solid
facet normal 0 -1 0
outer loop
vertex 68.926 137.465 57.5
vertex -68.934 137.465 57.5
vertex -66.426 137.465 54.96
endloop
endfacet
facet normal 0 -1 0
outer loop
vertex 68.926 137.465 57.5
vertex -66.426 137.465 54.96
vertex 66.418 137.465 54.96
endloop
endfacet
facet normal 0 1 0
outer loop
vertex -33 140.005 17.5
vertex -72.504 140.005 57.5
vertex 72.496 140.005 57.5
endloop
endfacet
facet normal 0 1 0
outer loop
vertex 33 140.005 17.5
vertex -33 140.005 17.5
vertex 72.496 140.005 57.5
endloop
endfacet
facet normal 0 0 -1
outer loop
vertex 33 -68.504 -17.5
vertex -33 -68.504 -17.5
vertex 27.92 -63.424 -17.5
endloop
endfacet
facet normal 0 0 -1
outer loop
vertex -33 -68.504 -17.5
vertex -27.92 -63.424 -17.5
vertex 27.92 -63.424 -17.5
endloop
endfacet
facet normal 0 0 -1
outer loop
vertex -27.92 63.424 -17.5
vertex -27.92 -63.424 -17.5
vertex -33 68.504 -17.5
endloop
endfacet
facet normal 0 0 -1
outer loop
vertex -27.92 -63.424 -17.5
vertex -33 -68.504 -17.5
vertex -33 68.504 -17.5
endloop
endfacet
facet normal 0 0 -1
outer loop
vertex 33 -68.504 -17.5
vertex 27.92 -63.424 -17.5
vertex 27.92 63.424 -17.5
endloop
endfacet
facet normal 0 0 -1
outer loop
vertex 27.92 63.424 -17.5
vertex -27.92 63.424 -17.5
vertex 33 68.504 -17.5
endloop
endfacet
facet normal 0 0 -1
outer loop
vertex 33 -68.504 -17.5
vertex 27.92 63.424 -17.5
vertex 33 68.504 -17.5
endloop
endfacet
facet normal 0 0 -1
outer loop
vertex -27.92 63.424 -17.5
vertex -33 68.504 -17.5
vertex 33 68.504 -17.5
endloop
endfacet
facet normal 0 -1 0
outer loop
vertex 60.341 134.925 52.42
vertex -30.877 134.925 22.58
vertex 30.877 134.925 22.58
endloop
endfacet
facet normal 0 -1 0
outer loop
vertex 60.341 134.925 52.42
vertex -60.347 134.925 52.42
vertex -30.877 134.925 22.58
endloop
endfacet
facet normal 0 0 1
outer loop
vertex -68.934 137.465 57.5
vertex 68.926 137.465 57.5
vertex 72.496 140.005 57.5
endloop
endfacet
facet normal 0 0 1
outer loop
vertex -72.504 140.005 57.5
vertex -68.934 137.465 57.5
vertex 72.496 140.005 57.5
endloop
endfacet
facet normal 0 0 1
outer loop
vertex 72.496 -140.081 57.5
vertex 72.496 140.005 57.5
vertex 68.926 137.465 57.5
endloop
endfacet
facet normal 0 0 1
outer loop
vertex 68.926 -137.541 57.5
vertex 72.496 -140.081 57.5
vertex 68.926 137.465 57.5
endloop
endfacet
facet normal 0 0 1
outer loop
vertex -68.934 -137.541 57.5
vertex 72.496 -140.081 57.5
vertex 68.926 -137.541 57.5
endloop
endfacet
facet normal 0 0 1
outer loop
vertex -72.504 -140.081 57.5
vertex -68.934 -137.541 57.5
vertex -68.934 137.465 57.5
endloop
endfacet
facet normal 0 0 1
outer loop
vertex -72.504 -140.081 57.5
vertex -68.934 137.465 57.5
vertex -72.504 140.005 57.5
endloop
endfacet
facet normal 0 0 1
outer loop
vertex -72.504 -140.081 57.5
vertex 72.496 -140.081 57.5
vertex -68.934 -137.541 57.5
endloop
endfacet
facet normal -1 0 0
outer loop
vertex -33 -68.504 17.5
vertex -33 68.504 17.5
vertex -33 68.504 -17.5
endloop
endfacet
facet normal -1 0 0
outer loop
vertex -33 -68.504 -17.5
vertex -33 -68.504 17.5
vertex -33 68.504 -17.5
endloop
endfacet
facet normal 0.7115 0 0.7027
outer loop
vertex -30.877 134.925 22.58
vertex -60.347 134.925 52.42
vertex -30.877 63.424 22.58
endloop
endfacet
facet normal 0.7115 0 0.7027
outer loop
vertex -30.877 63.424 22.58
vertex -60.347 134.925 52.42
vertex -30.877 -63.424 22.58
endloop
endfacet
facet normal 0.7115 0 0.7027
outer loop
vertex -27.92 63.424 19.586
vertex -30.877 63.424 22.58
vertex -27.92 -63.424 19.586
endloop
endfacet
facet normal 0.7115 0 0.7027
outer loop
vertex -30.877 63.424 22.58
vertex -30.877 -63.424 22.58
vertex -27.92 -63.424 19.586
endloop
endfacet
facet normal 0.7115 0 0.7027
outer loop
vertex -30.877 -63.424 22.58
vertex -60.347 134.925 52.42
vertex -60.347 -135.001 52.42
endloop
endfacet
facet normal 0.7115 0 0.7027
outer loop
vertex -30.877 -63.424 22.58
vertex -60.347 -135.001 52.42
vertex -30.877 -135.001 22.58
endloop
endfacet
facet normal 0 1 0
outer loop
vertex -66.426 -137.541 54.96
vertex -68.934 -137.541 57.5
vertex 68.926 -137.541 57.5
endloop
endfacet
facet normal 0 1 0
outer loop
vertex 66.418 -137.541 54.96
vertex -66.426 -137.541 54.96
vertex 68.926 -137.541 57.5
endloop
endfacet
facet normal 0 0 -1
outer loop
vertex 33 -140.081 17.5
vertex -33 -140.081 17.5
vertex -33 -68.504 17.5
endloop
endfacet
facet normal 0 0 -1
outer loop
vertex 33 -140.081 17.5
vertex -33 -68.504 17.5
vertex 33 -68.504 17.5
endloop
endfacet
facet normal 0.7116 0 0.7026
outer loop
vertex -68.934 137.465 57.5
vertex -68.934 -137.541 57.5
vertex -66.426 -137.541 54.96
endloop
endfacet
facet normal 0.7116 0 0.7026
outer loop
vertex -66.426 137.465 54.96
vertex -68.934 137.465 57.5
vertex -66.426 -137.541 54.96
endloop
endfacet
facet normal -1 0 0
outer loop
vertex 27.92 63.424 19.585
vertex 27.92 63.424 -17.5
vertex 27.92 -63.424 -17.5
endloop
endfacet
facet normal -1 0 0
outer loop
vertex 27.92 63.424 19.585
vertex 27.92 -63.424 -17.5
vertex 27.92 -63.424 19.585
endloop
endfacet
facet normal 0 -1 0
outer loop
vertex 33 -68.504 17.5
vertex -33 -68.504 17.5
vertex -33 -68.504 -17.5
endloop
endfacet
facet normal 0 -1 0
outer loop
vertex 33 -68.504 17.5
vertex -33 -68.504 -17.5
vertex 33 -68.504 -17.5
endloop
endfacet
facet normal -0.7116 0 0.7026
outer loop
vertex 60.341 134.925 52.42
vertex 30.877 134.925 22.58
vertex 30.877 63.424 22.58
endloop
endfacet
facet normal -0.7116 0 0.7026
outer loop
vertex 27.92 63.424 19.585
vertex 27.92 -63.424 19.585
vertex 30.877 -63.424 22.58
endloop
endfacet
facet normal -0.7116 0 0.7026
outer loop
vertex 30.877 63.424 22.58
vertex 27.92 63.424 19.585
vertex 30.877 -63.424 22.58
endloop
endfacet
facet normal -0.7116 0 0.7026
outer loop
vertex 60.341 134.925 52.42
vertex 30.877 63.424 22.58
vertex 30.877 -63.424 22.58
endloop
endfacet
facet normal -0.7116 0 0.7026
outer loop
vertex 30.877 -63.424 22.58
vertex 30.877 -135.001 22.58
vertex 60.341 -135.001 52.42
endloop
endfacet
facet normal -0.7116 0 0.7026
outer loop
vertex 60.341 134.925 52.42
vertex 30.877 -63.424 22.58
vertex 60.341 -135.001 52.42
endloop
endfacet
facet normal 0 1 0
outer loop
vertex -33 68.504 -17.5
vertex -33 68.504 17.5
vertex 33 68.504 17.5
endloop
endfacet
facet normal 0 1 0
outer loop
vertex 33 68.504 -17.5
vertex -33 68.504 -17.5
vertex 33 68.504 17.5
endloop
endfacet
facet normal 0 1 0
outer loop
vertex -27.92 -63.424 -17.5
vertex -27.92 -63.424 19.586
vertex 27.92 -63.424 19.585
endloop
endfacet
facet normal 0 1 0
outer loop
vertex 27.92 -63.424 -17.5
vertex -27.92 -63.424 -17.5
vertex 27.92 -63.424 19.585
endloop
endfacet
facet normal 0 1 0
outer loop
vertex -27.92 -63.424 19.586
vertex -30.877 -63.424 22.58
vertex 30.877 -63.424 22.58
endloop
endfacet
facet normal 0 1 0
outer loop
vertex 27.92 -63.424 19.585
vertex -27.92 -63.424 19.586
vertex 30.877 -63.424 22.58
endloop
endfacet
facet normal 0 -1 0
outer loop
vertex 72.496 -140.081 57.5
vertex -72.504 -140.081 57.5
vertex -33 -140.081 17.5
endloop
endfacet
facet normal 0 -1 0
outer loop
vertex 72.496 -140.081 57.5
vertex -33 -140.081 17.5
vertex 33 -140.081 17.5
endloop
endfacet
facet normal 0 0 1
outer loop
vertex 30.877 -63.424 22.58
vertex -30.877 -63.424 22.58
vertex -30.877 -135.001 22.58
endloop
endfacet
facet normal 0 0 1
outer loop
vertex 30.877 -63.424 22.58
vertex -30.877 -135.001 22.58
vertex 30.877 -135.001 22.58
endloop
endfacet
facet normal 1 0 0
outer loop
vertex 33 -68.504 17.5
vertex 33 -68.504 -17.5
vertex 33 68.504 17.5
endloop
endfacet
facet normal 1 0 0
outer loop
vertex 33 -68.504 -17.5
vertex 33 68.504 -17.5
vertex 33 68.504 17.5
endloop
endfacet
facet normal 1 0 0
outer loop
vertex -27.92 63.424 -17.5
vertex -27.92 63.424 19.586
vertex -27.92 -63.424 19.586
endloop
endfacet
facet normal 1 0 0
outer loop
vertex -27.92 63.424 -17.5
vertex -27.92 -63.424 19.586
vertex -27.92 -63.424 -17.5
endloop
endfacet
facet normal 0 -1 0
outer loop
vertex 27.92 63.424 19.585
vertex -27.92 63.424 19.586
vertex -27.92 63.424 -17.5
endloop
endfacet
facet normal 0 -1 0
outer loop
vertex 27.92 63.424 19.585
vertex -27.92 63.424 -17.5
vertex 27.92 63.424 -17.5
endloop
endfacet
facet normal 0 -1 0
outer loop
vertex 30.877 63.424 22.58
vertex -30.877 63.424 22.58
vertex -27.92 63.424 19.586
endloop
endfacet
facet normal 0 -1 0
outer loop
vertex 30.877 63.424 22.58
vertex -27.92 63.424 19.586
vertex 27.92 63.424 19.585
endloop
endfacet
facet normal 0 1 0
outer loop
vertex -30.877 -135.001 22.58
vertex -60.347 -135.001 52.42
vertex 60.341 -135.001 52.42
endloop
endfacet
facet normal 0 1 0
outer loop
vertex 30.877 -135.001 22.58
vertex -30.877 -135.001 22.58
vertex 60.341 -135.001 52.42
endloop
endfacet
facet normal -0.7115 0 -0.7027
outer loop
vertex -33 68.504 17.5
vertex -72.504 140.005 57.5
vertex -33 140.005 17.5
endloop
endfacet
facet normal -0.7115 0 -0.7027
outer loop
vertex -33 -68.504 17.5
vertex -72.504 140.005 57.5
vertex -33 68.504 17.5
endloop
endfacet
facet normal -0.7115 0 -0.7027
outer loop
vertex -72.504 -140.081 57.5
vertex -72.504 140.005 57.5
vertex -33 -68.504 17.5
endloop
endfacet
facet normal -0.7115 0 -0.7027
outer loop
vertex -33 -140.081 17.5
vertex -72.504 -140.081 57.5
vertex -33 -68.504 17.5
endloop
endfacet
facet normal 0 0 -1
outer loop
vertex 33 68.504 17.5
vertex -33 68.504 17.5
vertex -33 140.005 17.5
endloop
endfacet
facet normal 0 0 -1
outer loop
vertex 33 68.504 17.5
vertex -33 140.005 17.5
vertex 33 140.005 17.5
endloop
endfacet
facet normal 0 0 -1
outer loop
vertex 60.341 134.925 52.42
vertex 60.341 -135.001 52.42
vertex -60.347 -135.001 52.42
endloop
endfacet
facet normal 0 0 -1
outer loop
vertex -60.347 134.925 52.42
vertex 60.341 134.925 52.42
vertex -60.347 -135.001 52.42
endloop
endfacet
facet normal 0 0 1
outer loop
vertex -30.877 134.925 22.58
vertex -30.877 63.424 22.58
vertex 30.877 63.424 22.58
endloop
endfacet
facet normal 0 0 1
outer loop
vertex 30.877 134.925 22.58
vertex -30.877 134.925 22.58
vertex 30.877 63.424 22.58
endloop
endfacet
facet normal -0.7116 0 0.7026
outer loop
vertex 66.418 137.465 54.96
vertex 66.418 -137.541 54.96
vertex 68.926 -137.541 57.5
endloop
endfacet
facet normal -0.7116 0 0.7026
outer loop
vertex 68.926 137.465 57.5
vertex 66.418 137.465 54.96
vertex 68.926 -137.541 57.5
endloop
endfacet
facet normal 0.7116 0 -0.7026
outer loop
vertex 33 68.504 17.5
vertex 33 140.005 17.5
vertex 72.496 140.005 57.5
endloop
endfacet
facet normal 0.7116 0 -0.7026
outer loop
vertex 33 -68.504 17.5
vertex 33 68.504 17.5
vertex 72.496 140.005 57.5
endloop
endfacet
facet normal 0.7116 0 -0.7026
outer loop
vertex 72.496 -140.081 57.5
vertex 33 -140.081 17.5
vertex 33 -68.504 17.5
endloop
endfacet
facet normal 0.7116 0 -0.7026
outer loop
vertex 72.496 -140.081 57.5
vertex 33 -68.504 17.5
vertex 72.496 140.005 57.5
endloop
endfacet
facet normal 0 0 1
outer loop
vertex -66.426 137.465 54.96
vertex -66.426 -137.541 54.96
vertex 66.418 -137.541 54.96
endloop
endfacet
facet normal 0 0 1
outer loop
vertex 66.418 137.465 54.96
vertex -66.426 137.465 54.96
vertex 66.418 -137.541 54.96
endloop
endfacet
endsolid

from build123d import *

# Parameters (mm, degrees)
F1_DEPTH     = 140.081
F2_DEPTH     = 140.0048
F3_DEPTH     = 68.5038
F4_DEPTH     = 68.5038
F5_T         = -5.08
F6_T         = 2.54
F6_T3_DEPTH  = 142.0876
F6_T5_DEPTH  = 71.08
F6_T7_DEPTH  = 275.0058
F6_T9_DEPTH  = 47.0194652776
F6_T11_DEPTH = 76.581
F6_T13_DEPTH = 9.2884577092
F6_T15_DEPTH = 76.6572
F6_T17_DEPTH = 125.7681103512
F6_T19_DEPTH = 47.0149573841
F6_T21_DEPTH = 66.8341103512
F6_T23_DEPTH = 47.0149573841
F6_T25_DEPTH = 9.2884593969
F6_T27_DEPTH = 42.1653521873
F6_T29_DEPTH = 42.16567527


# Not quite as in the source:
# - a shell that OpenCascade refuses in one call is made with other operations: the cavity is built on its own and cut out


with BuildPart() as f1:
    # F0 (on Front) → F1 (new body)
    with BuildSketch(Plane.XZ):
        Polygon((-72.5043, 57.5), (-33, 17.5), (0, 17.5), (33, 17.5), (72.4957, 57.5), align=None)
    extrude(amount=F1_DEPTH)

    # F0 (on Front) → F2 (join)
    with BuildSketch(Plane.XZ):
        Polygon((-72.5043, 57.5), (-33, 17.5), (0, 17.5), (33, 17.5), (72.4957, 57.5), align=None)
    extrude(amount=-F2_DEPTH)

    # F0 (on Front) → F3 (join)
    with BuildSketch(Plane.XZ):
        Polygon((-33, 17.5), (-33, -17.5), (33, -17.5), (33, 17.5), (0, 17.5), align=None)
    extrude(amount=-F3_DEPTH)

    # F0 (on Front) → F4 (join)
    with BuildSketch(Plane.XZ):
        Polygon((-33, 17.5), (-33, -17.5), (33, -17.5), (33, 17.5), (0, 17.5), align=None)
    extrude(amount=F4_DEPTH)

    # F5
    f5_openings = [f1.faces().sort_by_distance(p)[0] for p in [
        (0, 0, -17.5),
    ]]
    offset(amount=F5_T, openings=f5_openings, kind=Kind.INTERSECTION)

    # F6: shell of thickness 2.54, made by hand


with BuildPart() as f6_core1:
    # F6_t2: copy of F1
    add(f1.part)

    # the walls: a layer under each face that stays
    f6_faces = [f6_core1.faces().sort_by_distance(p)[0] for p in [
        (-52.75215, -0.0381, 37.5),
        (-0.0043, 140.0048, 37.5),
        (52.74785, -0.0381, 37.5),
        (33, 0, 0),
        (0, -68.5038, 0),
        (0, 68.5038, 0),
        (0, 104.2543, 17.5),
        (-33, 0, 0),
        (0, -104.2924, 17.5),
        (-0.0043, -140.081, 37.5),
        (-28.2857142857, 58.7175428571, -17.5),
        (-44.1337126804, -0.0381, 36.002837635),
        (-0.0033701852, 134.9248, 37.5),
        (44.1303424952, -0.0381, 36.0026760937),
        (27.92, 0, 1.0426760937),
        (28.4128154651, -63.4238, 21.0826760937),
        (0, -63.4238, 2.54),
        (-29.3986087804, -63.4238, 22.0809458783),
        (28.4128154651, 63.4238, 21.0826760937),
        (0, 63.4238, 2.54),
        (-29.3986087804, 63.4238, 22.0809458783),
        (-0.0001623852, 99.1743, 22.58),
        (-27.92, 0, 1.042837635),
        (-0.0001623852, -99.2124, 22.58),
        (-0.0033701852, -135.001, 37.5),
        (-0.0033701852, -0.0381, 52.42),
    ]]
    thicken(f6_faces, amount=-F6_T, mode=Mode.SUBTRACT)

    # F6_s4 → F6_t3 (cut)
    with BuildSketch(Plane.XZ.offset(-71.0438)):
        Polygon((-33.0434721427, 17.4821518164), (-31.192785733, 19.2848183642), (-30.46, 18.542837635), (-30.46, 17.5), align=None)
        Polygon((33.0434740854, 17.4821537837), (31.1925914624, 19.2846216345), (30.46, 18.5426760937), (30.46, 17.5), align=None)
    extrude(amount=F6_T3_DEPTH, mode=Mode.SUBTRACT)

    # F6_s6 → F6_t5 (cut)
    with BuildSketch(Plane.YZ.offset(-35.54)):
        Polygon((-68.5292, 17.4746), (-65.9638, 17.5), (-65.9638, 20.04), (-68.5038, 20.04), align=None)
        Polygon((68.5292, 17.4746), (65.9638, 17.5), (65.9638, 20.04), (68.5038, 20.04), align=None)
    extrude(amount=F6_T5_DEPTH, mode=Mode.SUBTRACT)

    # F6_s8 → F6_t7 (cut)
    with BuildSketch(Plane.XZ.offset(-137.4648)):
        Polygon((-60.3293532181, 52.4124481836), (-62.1546396278, 50.6351816358), (-66.4258626804, 54.96), (-60.3474253608, 54.96), align=None)
        Polygon((60.322610905, 52.4124462163), (62.148093528, 50.6353783655), (66.4181924952, 54.96), (60.3406849904, 54.96), align=None)
    extrude(amount=F6_T7_DEPTH, mode=Mode.SUBTRACT)

    # F6_s10 → F6_t9 (cut)
    with BuildSketch(Plane(origin=(-57.7902488571, 0, 58.5154009635), x_dir=(0, 1, 0), z_dir=(0.7026843954, 0, -0.7115016799))):
        Polygon((134.8994, -6.0771785187), (134.9248, -8.6425785187), (137.4648, -8.6425785187), (137.4648, -6.1025785187), align=None)
        Polygon((-134.9756, -6.0771785187), (-135.001, -8.6425785187), (-137.541, -8.6425785187), (-137.541, -6.1025785187), align=None)
    extrude(amount=F6_T9_DEPTH, mode=Mode.SUBTRACT)

    # F6_s12 → F6_t11 (cut)
    with BuildSketch(Plane.XZ.offset(-137.4648)):
        Polygon((-30.8591454181, 22.6232481836), (-32.6844318278, 20.7951816358), (-31.9386087804, 20.04), (-30.8772175608, 20.04), align=None)
        Polygon((30.858818705, 22.6232462163), (32.684301328, 20.7953783655), (31.9384463952, 20.04), (30.8768927904, 20.04), align=None)
    extrude(amount=F6_T11_DEPTH, mode=Mode.SUBTRACT)

    # F6_s14 → F6_t13 (cut)
    with BuildSketch(Plane(origin=(-28.3200410571, 0, 28.6754009635), x_dir=(0, 1, 0), z_dir=(0.7026843954, 0, -0.7115016799))):
        Polygon((63.3984, -6.0771785187), (63.4238, -8.6425785187), (65.9638, -8.6425785187), (65.9638, -6.1025785187), align=None)
        Polygon((-63.3984, -6.0771785187), (-63.4238, -8.6425785187), (-65.9638, -8.6425785187), (-65.9638, -6.1025785187), align=None)
    extrude(amount=F6_T13_DEPTH, mode=Mode.SUBTRACT)

    # F6_s16 → F6_t15 (cut)
    with BuildSketch(Plane.XZ.offset(60.8838)):
        Polygon((-30.8591454181, 22.6232481836), (-32.6844318278, 20.7951816358), (-31.9386087804, 20.04), (-30.8772175608, 20.04), align=None)
        Polygon((30.858818705, 22.6232462163), (32.684301328, 20.7953783655), (31.9384463952, 20.04), (30.8768927904, 20.04), align=None)
    extrude(amount=F6_T15_DEPTH, mode=Mode.SUBTRACT)

    # F6_s18 → F6_t17 (cut)
    with BuildSketch(Plane.YZ.offset(-62.8874253608)):
        Polygon((134.8994, 52.3946), (137.4648, 52.42), (137.4648, 54.96), (134.9248, 54.96), align=None)
        Polygon((-134.9756, 52.3946), (-137.541, 52.42), (-137.541, 54.96), (-135.001, 54.96), align=None)
    extrude(amount=F6_T17_DEPTH, mode=Mode.SUBTRACT)

    # F6_s20 → F6_t19 (cut)
    with BuildSketch(Plane(origin=(57.7800845012, 0, 58.5178482733), x_dir=(0, 1, 0), z_dir=(-0.7026069427, 0, -0.7115781644))):
        Polygon((134.8994, 6.0810579283), (137.4648, 6.1064579283), (137.4648, 8.6464579283), (134.9248, 8.6464579283), align=None)
    extrude(amount=F6_T19_DEPTH, mode=Mode.SUBTRACT)

    # F6_s22 → F6_t21 (cut)
    with BuildSketch(Plane.YZ.offset(-33.4172175608)):
        Polygon((134.8994, 22.6054), (137.4648, 22.58), (137.4648, 20.04), (134.9248, 20.04), align=None)
        Polygon((-134.9756, 22.6054), (-135.001, 20.04), (-137.541, 20.04), (-137.541, 22.58), align=None)
    extrude(amount=F6_T21_DEPTH, mode=Mode.SUBTRACT)

    # F6_s24 → F6_t23 (cut)
    with BuildSketch(Plane(origin=(24.7470490323, 0, 25.0630311981), x_dir=(0, 1, 0), z_dir=(0.7026069427, 0, 0.7115781644))):
        Polygon((-134.9756, -6.0810579283), (-135.001, -8.6464579283), (-137.541, -8.6464579283), (-137.541, -6.1064579283), align=None)
    extrude(amount=F6_T23_DEPTH, mode=Mode.SUBTRACT)

    # F6_s26 → F6_t25 (cut)
    with BuildSketch(Plane(origin=(21.7901562419, 0, 22.0683833854), x_dir=(0, 1, 0), z_dir=(0.7026069427, 0, 0.7115781644))):
        Polygon((-63.3984, -6.0810579283), (-63.4238, -8.6464579283), (-65.9638, -8.6464579283), (-65.9638, -6.1064579283), align=None)
        Polygon((63.3984, -6.0810579283), (63.4238, -8.6464579283), (65.9638, -8.6464579283), (65.9638, -6.1064579283), align=None)
    extrude(amount=F6_T25_DEPTH, mode=Mode.SUBTRACT)

    # F6_s28 → F6_t27 (cut)
    with BuildSketch(Plane.XY.offset(-20.04)):
        Polygon((27.8946, 63.3984), (30.46, 63.4238), (30.46, 65.9638), (27.92, 65.9638), align=None)
        Polygon((27.8946, -63.3984), (30.46, -63.4238), (30.46, -65.9638), (27.92, -65.9638), align=None)
    extrude(amount=F6_T27_DEPTH, mode=Mode.SUBTRACT)

    # F6_s30 → F6_t29 (cut)
    with BuildSketch(Plane.XY.offset(-20.04)):
        Polygon((-27.8946, -63.3984), (-27.92, -65.9638), (-30.46, -65.9638), (-30.46, -63.4238), align=None)
        Polygon((-27.8946, 63.3984), (-27.92, 65.9638), (-30.46, 65.9638), (-30.46, 63.4238), align=None)
    extrude(amount=F6_T29_DEPTH, mode=Mode.SUBTRACT)


with BuildPart() as f1_1:
    add(f1.part)

    # what is left inside the walls is the cavity
    f6_cavity = [f6_core1.part.solids().sort_by_distance(p)[0] for p in [
        (-0.004108, -45.8724, 57.4746),
    ]]
    add(f6_cavity, mode=Mode.SUBTRACT)


solid = f1_1.part
